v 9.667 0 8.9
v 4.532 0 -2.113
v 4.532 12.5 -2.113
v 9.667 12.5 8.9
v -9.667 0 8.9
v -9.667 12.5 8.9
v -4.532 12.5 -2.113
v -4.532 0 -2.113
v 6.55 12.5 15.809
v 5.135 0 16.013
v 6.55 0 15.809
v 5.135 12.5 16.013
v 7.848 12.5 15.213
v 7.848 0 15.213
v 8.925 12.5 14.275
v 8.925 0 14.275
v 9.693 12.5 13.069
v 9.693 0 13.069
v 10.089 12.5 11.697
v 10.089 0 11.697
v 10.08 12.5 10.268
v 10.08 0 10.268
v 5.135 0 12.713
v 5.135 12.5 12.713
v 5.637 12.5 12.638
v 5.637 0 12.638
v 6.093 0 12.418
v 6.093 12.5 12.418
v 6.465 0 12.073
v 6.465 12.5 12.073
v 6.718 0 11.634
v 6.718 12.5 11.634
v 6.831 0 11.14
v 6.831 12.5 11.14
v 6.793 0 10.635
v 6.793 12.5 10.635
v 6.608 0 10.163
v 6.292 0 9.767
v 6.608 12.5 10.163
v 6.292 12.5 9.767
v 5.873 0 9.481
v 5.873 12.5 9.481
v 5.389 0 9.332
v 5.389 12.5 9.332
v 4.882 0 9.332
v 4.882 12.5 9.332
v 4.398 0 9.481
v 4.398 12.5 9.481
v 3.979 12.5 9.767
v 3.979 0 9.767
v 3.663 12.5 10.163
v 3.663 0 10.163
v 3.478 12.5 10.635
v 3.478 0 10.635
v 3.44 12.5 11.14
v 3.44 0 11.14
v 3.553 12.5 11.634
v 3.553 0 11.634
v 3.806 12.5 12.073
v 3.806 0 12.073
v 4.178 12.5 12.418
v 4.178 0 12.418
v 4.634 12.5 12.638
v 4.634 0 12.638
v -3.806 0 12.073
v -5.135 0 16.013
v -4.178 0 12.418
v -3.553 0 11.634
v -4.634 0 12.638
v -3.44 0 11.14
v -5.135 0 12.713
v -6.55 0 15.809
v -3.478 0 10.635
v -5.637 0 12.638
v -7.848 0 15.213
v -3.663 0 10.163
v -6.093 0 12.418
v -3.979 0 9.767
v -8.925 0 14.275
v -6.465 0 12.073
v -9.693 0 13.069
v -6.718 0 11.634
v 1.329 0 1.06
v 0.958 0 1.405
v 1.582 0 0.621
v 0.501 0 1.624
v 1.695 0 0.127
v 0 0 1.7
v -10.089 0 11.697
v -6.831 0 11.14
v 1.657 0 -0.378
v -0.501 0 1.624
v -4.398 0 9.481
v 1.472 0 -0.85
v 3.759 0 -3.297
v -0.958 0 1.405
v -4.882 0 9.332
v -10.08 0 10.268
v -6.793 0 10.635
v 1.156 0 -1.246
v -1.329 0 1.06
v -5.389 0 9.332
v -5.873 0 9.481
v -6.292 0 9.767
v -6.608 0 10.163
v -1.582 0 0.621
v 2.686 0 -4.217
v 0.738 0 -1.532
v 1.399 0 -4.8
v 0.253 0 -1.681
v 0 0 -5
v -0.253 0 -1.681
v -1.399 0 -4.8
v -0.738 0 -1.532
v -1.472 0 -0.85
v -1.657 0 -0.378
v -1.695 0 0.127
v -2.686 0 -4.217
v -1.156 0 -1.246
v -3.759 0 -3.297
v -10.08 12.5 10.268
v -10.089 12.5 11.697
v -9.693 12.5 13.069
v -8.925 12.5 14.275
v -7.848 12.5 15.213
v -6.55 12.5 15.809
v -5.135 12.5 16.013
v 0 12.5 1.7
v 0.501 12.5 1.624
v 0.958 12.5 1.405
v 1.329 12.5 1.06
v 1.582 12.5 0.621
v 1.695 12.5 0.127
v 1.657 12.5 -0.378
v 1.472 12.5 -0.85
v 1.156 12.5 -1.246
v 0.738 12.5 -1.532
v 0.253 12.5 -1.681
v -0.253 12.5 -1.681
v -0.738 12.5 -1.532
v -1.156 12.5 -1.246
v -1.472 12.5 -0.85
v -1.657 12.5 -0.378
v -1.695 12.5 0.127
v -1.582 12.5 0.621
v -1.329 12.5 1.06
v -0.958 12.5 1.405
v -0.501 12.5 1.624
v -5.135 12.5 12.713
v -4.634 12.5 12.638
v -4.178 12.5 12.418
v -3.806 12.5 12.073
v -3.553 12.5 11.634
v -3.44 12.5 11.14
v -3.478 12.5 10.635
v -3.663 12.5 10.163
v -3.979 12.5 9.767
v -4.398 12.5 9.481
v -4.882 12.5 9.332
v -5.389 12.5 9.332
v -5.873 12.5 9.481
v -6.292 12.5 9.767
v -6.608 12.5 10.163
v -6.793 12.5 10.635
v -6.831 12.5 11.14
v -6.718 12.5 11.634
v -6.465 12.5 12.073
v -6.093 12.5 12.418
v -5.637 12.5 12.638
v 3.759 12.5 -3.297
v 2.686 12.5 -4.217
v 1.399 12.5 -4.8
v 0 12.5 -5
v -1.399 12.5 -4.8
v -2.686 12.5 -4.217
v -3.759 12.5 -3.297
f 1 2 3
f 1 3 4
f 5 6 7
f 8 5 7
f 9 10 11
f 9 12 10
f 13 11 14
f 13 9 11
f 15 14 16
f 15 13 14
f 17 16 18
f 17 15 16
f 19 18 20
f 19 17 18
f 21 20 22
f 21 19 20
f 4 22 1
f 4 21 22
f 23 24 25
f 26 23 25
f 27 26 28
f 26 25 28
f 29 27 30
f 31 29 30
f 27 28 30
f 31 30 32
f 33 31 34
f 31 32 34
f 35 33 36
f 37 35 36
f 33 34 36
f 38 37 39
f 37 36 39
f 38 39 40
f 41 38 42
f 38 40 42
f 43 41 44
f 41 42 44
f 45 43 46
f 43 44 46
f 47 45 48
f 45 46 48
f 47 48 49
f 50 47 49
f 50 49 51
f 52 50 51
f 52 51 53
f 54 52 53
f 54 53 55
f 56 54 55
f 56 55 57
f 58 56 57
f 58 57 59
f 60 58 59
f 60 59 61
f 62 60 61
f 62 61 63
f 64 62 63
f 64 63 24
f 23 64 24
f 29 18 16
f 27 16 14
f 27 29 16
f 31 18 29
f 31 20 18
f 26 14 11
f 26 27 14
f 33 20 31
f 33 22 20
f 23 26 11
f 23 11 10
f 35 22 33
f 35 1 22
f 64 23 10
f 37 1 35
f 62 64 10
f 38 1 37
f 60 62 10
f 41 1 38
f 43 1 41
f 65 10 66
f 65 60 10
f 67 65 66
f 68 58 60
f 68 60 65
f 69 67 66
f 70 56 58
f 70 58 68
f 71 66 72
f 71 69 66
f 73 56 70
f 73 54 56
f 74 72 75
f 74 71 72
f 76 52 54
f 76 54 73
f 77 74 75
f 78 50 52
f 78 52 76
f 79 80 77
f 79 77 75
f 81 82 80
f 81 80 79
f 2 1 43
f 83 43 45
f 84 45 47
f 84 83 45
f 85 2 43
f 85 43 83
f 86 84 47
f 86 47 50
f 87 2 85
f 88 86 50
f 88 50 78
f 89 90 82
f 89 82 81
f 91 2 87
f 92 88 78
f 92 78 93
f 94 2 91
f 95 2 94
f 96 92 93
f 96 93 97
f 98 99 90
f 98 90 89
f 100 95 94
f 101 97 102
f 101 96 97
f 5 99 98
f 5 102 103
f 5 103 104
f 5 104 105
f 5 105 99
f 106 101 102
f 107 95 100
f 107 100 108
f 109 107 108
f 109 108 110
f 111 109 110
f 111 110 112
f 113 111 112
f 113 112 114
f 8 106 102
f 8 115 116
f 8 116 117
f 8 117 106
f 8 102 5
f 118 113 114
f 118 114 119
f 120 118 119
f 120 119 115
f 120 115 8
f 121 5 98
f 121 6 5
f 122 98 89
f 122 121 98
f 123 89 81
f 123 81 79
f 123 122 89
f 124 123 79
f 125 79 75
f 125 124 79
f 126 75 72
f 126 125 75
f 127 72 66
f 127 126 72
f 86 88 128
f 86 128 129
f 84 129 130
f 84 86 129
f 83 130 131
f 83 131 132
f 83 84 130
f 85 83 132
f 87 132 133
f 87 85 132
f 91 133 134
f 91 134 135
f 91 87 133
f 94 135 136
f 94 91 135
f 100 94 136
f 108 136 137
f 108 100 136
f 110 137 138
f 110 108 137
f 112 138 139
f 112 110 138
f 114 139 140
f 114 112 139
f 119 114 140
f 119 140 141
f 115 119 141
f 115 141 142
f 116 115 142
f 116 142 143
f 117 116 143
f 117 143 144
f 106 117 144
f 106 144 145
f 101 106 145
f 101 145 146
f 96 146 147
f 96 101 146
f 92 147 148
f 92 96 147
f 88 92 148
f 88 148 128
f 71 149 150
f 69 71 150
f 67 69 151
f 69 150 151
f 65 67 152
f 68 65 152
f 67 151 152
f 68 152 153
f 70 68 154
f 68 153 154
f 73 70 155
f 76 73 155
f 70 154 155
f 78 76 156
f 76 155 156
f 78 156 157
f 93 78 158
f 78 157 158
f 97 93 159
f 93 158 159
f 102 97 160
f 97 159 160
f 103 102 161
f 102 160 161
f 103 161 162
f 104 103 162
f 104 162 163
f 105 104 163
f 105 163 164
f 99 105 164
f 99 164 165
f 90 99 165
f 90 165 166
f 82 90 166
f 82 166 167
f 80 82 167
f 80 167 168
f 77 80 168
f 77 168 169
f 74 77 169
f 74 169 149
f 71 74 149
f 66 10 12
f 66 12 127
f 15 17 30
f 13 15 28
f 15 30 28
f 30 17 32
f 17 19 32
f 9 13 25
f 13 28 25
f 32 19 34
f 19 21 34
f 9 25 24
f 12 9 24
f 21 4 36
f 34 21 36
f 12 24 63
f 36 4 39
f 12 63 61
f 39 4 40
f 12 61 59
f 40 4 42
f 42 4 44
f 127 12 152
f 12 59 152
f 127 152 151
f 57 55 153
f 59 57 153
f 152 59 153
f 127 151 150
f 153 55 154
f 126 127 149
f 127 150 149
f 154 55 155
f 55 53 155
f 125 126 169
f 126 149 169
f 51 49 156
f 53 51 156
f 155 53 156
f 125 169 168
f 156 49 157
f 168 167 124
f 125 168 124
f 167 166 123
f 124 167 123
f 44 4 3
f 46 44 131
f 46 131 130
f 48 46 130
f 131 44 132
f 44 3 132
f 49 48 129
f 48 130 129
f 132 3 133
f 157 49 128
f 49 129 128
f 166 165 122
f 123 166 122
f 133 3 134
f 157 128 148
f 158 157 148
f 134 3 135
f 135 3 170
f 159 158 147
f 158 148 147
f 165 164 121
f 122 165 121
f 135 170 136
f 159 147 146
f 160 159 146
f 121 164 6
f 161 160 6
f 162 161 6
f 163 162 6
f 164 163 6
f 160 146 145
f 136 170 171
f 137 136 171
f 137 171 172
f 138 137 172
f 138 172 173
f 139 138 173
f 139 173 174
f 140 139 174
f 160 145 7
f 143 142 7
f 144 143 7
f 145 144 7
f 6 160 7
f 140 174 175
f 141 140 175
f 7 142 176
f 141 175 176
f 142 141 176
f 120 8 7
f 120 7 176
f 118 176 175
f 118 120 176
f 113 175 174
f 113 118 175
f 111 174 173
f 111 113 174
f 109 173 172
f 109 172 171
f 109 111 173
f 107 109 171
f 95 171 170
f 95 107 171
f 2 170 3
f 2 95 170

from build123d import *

# Parameters (mm, degrees)
SKETCH_1_R          = 1.7
EXTRUDE_1_DEPTH     = 12.5
FILLET_1_R          = 5
SKETCH_2_R          = 1.7
CUT_EXTRUDE_1_DEPTH = 14


with BuildPart() as part:
    # 草图1 → 凸台-拉伸1 (new body)
    with BuildSketch(Plane(origin=(0, 0, 0), x_dir=(1, 0, 0), z_dir=(0, 1, 0))):
        with BuildLine():
            Line((-12.98390417, -16.013064432), (-4.531538935, 2.113091309))
            ThreePointArc((-4.531538935, 2.113091309), (0, 5), (4.531538935, 2.113091309))
            Line((4.531538935, 2.113091309), (12.98390417, -16.013064432))
            Line((12.98390417, -16.013064432), (-12.98390417, -16.013064432))
        make_face()
        with Locations(Location((0, 0, 0), (0, 0, 270))):
            Circle(SKETCH_1_R, mode=Mode.SUBTRACT)
    extrude(amount=EXTRUDE_1_DEPTH)

    # 圆角1
    fillet_1_edges = [part.edges().sort_by_distance(p)[0] for p in [
        (-12.98390417, 6.25, 16.013064432),
        (12.98390417, 6.25, 16.013064432),
    ]]
    fillet(fillet_1_edges, radius=FILLET_1_R)

    # 草图2 → 切除-拉伸1 (cut)
    with BuildSketch(Plane(origin=(0, 12.5, 0), x_dir=(1, 0, 0), z_dir=(0, 1, 0))):
        with Locations(Location((-5.135476284, -11.013064432, 0), (0, 0, 270))):
            Circle(SKETCH_2_R)
        with Locations(Location((5.135476284, -11.013064432, 0), (0, 0, 270))):
            Circle(SKETCH_2_R)
    extrude(amount=-CUT_EXTRUDE_1_DEPTH, mode=Mode.SUBTRACT)


solid = part.part
